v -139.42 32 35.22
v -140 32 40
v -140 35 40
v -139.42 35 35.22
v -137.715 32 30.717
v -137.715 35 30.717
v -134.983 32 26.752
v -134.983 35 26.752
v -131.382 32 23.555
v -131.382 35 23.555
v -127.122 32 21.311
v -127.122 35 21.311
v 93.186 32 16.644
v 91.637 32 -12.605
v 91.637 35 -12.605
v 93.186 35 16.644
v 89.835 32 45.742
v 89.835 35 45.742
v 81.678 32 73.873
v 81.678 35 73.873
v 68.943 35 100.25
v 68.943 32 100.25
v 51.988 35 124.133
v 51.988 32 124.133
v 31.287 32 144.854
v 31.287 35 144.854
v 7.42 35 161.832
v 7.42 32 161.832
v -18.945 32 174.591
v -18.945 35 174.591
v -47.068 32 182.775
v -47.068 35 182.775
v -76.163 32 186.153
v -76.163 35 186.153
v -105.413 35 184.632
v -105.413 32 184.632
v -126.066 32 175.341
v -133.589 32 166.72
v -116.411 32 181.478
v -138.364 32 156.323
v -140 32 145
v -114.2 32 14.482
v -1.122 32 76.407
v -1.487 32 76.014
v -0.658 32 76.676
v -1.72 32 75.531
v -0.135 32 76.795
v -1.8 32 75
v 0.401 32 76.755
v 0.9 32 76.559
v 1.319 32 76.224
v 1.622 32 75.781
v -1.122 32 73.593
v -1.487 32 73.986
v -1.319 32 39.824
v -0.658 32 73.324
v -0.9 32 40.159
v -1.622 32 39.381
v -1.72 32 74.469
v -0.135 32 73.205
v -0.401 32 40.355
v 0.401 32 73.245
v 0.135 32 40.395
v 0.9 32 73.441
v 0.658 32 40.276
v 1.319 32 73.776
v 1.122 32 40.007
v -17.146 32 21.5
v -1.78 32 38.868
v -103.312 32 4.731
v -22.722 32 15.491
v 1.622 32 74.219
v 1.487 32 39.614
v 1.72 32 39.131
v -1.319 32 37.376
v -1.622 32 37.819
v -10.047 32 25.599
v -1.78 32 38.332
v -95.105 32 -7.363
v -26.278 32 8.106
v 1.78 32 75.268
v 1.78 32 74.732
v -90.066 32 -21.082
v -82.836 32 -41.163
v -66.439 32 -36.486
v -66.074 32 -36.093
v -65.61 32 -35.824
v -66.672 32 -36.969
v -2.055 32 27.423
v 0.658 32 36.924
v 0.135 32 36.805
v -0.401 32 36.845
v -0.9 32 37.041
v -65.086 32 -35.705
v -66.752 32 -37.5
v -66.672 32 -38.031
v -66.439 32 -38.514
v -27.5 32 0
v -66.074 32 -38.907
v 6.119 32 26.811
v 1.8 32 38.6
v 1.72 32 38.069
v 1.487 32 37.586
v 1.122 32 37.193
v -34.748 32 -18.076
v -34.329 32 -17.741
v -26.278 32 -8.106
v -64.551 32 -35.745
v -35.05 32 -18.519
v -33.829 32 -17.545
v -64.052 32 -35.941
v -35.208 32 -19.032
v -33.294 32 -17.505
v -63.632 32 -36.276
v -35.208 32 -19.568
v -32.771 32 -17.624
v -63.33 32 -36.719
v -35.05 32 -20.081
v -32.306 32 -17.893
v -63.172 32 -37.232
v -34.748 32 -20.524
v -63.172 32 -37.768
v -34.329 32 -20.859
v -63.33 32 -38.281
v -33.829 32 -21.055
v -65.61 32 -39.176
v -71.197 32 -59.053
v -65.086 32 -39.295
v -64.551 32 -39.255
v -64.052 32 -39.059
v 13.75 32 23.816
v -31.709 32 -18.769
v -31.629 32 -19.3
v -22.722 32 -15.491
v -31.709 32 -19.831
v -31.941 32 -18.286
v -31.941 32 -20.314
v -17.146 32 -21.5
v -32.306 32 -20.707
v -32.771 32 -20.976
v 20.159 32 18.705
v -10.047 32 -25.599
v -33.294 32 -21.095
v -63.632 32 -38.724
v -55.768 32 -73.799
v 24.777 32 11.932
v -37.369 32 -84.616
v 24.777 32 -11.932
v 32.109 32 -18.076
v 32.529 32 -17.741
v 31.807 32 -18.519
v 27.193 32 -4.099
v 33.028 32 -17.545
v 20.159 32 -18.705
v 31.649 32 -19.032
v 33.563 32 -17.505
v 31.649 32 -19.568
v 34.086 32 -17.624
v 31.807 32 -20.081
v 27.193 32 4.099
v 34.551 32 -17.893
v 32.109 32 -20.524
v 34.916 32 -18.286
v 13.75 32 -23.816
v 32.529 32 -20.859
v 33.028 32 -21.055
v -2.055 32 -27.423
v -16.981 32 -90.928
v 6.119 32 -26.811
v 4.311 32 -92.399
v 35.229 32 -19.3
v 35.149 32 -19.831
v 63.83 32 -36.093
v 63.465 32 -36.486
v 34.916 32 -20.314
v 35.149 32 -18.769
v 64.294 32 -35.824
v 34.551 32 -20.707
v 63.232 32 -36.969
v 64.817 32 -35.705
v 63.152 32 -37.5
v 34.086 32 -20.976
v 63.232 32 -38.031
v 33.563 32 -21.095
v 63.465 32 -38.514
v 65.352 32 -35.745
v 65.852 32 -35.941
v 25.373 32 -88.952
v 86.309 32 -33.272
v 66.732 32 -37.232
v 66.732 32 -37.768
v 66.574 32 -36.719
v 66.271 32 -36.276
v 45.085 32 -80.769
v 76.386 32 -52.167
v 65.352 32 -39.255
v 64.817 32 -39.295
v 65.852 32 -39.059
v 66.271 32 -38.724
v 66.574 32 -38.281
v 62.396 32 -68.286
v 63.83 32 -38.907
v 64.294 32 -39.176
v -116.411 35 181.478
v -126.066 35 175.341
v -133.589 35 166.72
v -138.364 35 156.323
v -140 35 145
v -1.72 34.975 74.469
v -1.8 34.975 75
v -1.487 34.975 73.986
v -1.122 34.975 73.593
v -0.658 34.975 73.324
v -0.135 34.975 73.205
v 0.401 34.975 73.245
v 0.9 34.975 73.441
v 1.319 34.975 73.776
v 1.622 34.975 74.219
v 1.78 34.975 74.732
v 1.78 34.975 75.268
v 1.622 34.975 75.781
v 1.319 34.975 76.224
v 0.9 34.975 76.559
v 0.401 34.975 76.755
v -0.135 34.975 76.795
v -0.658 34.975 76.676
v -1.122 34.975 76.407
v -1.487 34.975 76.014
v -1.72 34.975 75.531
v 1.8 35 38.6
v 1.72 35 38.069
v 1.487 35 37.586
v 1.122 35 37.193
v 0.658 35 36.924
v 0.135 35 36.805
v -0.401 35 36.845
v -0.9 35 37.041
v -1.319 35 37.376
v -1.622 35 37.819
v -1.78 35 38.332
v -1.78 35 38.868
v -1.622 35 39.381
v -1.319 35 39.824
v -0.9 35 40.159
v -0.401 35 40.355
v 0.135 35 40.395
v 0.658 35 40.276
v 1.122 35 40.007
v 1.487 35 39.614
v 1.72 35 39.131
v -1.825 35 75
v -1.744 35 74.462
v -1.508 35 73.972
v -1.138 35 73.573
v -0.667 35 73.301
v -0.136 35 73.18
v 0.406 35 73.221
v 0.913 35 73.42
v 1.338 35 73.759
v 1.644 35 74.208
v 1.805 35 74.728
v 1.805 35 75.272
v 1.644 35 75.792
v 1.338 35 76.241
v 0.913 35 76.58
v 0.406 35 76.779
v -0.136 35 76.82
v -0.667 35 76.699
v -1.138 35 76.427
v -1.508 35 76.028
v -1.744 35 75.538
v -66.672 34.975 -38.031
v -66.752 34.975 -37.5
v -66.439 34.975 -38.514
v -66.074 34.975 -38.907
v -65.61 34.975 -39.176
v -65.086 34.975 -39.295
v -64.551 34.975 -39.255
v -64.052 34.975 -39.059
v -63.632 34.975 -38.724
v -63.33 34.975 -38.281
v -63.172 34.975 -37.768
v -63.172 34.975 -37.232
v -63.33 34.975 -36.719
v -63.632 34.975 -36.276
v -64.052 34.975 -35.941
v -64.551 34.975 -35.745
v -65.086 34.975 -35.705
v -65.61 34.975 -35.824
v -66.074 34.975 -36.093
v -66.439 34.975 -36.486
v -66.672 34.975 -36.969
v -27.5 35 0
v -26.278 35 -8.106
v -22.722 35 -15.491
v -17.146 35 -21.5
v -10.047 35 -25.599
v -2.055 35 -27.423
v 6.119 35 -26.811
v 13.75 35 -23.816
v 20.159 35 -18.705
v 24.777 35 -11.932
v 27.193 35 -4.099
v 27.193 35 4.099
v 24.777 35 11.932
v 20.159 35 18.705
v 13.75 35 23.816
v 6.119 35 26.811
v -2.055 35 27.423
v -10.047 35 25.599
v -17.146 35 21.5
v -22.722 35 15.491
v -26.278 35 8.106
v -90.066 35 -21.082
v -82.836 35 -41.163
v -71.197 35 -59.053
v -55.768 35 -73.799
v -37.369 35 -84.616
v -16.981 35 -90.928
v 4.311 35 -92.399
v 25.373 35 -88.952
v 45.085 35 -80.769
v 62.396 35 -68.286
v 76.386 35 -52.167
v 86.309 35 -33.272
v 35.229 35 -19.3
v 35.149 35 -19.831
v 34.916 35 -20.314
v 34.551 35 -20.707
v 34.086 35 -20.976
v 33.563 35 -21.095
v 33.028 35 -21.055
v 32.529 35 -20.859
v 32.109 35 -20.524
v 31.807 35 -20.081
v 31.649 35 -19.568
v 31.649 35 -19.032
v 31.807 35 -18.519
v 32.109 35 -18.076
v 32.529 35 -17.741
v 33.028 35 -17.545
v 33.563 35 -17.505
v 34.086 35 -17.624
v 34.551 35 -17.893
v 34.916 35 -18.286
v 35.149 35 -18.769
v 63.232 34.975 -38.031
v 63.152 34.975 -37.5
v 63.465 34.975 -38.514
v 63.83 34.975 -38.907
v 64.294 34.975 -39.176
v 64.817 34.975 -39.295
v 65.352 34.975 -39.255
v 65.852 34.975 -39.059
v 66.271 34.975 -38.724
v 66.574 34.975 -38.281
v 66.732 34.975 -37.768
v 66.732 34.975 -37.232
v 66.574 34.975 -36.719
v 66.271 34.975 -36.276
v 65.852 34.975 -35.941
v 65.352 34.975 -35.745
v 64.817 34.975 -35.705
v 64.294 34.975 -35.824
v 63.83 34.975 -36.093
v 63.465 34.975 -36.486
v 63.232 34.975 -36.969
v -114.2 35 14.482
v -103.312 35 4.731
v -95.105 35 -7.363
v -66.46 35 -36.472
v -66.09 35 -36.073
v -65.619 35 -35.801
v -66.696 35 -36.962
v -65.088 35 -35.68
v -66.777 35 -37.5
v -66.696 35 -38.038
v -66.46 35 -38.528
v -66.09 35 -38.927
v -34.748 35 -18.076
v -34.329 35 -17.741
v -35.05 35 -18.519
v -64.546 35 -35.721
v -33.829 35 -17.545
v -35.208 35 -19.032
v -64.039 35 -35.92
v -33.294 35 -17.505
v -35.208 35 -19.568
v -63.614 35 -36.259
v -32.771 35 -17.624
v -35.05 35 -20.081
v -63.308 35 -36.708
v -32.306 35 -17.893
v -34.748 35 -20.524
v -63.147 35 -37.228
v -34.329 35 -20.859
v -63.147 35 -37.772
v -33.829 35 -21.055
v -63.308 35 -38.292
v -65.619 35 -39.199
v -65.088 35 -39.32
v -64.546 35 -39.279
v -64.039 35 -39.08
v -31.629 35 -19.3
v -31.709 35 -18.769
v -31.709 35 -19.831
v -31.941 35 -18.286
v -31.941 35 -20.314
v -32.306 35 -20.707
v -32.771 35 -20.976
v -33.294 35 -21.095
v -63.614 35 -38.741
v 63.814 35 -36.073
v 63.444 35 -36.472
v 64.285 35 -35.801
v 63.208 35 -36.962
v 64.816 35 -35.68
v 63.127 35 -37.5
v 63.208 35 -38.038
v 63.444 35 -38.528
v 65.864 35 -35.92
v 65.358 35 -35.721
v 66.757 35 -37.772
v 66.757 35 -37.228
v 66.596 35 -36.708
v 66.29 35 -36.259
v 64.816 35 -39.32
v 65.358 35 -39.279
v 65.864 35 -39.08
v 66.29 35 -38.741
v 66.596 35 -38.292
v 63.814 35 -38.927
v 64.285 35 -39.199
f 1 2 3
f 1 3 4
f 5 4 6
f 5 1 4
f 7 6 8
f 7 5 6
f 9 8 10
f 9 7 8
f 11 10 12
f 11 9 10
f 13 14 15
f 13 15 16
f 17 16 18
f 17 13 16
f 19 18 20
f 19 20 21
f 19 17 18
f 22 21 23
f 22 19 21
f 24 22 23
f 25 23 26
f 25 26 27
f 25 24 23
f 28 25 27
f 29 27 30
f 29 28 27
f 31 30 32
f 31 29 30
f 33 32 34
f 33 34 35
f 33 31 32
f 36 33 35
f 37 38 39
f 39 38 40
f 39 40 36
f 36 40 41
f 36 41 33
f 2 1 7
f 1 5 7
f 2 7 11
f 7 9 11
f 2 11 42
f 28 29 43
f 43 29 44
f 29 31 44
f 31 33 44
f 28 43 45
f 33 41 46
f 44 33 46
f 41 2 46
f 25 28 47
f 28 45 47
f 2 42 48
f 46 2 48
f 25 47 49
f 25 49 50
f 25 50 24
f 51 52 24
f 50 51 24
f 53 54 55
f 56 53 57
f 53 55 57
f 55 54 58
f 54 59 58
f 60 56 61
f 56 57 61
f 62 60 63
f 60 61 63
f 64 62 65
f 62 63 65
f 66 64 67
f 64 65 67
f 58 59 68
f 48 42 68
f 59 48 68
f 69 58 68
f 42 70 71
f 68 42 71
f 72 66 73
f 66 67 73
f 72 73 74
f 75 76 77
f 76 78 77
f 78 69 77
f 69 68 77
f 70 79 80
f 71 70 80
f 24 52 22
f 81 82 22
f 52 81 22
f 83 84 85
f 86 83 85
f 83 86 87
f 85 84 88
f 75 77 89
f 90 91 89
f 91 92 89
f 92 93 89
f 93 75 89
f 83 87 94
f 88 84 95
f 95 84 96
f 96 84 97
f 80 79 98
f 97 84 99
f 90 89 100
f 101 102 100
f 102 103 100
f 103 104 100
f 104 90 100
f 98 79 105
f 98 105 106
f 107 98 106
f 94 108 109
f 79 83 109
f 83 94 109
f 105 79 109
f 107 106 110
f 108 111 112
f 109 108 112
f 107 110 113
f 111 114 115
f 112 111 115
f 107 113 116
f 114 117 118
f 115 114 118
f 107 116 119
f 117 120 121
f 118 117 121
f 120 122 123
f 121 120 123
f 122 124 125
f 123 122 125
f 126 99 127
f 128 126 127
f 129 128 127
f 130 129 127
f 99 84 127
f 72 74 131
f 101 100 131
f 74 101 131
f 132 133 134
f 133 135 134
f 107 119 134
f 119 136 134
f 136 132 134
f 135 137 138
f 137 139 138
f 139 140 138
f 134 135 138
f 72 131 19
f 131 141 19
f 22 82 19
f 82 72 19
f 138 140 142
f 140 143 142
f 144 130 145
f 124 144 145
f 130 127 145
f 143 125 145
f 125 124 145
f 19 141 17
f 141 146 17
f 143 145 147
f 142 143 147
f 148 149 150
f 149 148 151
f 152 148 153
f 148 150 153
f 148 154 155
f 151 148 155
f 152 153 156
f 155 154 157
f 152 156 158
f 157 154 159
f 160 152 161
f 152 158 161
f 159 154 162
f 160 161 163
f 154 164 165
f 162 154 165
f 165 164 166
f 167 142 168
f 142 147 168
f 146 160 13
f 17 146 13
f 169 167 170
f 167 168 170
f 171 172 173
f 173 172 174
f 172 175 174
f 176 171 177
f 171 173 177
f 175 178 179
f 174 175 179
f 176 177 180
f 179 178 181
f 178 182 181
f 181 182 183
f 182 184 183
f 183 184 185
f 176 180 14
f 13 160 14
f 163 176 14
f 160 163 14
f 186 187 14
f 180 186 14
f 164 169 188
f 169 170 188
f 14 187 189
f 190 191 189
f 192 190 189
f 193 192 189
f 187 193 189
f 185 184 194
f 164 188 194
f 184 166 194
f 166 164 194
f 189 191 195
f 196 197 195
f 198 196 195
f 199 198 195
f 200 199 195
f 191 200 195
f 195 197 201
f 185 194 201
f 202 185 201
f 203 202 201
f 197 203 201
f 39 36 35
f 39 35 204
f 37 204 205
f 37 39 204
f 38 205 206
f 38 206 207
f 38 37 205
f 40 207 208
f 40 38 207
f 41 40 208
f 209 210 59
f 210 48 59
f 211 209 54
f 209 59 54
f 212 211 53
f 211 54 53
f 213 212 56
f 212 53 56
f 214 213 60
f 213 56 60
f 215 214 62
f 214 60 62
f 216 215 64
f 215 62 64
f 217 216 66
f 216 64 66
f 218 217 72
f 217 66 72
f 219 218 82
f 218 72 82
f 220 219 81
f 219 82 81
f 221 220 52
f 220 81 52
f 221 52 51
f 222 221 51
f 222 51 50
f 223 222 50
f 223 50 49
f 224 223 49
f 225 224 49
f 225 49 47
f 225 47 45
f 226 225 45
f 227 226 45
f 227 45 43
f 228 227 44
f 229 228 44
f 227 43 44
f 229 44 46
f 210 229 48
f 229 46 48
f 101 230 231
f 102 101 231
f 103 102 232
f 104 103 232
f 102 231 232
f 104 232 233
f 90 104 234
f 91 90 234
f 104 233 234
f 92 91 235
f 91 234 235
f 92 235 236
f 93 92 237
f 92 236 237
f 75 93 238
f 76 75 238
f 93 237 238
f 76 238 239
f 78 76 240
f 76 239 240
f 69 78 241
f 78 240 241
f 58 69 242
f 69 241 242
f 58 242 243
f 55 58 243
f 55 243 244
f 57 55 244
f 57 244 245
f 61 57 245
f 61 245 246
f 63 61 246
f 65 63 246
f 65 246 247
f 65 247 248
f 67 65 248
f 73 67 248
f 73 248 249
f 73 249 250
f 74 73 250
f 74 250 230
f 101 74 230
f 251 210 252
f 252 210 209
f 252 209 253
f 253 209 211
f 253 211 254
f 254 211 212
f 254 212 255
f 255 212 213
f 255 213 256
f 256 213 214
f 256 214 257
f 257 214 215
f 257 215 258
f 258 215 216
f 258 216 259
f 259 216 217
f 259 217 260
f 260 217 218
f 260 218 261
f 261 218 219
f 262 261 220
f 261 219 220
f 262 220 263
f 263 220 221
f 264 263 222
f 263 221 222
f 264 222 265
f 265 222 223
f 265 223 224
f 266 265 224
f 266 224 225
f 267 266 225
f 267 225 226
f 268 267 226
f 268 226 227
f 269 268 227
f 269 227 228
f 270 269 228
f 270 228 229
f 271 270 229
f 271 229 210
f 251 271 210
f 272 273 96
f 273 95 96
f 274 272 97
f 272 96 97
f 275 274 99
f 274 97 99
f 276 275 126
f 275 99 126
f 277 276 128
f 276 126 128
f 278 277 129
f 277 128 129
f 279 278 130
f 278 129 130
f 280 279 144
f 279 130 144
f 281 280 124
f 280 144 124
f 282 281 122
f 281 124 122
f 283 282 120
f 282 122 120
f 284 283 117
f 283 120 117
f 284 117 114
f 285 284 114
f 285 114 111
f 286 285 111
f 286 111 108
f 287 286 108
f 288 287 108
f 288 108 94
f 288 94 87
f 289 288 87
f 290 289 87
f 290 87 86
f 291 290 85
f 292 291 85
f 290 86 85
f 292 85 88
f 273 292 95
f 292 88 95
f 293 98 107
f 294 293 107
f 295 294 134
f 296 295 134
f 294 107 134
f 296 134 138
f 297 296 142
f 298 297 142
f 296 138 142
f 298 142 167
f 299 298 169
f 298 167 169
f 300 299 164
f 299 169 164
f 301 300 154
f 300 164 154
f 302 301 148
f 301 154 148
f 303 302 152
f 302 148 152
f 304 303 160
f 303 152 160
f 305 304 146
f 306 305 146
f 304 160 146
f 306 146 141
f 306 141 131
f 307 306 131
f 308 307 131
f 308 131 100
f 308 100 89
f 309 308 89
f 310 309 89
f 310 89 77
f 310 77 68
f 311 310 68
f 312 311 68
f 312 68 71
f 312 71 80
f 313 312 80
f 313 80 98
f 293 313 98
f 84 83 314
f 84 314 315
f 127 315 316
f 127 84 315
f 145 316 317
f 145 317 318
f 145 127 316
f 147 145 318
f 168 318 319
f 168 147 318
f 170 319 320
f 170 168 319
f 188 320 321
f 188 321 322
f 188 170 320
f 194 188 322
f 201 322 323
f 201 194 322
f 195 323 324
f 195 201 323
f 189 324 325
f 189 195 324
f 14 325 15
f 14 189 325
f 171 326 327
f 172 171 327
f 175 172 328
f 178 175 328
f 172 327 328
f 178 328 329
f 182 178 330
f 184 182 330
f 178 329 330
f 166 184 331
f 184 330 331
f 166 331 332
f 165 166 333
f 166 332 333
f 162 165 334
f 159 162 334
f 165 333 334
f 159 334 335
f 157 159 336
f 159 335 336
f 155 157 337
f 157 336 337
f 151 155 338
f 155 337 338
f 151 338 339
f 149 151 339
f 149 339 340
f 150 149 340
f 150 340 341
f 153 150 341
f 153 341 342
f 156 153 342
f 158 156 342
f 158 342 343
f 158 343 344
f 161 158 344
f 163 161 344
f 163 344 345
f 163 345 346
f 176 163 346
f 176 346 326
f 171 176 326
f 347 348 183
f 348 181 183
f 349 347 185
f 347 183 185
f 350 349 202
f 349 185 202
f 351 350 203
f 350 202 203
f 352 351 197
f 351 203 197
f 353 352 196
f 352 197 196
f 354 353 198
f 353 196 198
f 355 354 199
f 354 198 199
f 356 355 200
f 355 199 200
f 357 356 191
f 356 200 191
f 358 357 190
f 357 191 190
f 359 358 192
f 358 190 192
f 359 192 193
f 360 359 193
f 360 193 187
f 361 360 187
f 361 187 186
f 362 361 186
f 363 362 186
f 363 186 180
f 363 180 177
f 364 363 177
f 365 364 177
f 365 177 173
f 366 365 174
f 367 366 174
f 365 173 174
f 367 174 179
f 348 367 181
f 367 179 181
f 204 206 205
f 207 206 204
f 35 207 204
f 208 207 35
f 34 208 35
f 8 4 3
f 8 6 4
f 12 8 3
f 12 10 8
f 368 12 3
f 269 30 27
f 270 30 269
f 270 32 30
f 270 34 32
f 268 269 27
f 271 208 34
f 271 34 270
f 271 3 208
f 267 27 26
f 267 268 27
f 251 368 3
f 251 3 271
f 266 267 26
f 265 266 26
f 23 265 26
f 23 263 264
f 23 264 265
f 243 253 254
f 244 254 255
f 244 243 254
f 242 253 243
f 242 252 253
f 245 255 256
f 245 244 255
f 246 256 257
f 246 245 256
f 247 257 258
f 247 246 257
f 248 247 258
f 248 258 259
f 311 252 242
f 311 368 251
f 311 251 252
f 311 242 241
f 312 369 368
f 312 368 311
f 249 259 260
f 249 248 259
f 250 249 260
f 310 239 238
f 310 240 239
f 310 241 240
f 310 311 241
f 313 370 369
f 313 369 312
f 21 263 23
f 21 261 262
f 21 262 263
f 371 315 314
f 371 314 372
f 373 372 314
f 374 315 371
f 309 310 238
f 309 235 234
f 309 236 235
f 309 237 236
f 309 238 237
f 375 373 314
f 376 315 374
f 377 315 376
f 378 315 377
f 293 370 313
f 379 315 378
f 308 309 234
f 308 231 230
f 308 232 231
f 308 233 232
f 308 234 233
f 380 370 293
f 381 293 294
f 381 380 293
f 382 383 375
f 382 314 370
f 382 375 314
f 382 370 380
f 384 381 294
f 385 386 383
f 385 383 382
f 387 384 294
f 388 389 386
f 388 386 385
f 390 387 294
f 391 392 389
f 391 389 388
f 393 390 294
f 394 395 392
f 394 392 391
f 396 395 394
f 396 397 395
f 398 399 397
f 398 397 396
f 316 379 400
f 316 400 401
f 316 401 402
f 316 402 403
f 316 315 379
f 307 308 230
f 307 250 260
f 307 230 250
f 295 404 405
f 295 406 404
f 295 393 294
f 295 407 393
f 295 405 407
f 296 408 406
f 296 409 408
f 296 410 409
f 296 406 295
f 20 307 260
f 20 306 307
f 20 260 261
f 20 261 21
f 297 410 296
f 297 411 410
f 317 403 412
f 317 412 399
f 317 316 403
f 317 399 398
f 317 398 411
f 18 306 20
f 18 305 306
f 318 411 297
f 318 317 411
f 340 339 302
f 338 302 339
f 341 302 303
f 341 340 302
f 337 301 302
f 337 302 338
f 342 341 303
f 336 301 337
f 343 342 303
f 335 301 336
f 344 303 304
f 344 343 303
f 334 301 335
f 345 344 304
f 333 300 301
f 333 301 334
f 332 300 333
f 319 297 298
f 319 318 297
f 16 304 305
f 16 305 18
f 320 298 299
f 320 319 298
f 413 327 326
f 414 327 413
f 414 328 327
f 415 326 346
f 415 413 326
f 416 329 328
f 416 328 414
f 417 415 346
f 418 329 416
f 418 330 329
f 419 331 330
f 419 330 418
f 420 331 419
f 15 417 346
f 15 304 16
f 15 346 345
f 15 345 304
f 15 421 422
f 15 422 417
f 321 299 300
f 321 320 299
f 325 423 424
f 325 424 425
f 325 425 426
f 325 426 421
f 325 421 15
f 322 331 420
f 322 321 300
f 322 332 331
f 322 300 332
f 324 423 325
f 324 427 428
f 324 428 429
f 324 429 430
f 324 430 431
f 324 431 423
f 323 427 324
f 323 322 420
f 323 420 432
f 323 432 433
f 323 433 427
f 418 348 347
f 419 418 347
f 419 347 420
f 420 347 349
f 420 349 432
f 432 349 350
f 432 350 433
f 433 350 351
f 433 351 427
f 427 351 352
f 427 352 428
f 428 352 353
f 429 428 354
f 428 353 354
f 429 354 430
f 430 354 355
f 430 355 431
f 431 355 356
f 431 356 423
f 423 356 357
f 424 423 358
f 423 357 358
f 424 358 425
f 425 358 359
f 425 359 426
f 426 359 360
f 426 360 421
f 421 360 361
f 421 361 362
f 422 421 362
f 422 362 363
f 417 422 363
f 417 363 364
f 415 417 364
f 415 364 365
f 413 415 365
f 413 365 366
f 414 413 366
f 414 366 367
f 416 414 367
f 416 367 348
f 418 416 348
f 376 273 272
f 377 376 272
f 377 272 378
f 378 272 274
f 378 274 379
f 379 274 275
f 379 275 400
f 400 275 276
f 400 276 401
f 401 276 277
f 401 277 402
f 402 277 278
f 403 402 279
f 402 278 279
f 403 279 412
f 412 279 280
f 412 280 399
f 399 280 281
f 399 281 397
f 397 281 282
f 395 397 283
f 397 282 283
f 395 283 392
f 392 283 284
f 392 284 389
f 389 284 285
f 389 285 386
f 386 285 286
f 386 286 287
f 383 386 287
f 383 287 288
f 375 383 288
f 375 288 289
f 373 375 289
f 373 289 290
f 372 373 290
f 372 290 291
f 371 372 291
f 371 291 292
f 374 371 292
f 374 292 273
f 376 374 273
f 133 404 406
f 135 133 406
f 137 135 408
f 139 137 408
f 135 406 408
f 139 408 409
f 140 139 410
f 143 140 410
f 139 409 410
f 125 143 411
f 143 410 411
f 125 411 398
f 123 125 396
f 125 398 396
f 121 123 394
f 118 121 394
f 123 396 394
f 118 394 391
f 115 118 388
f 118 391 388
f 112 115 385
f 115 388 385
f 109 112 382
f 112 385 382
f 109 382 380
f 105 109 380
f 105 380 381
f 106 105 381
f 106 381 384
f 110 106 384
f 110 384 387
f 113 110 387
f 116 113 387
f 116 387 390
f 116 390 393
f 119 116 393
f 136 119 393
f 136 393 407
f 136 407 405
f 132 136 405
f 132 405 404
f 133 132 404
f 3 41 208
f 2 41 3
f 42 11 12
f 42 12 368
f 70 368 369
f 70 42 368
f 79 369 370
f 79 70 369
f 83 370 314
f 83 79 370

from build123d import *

# Parameters (mm, degrees)
SKETCH1_W                      = 400
SKETCH1_H                      = 400
BOSS_EXTRUDE1_DEPTH            = 3
HOLE1_D                        = 55
HOLE1_DEPTH                    = 100
M3_CLEARANCE_HOLE2_D           = 3.6
SKETCH14_W                     = 654.860874268
SKETCH14_H                     = 577.568605061
CUT_EXTRUDE2_DEPTH             = 324.704448038
M3_CLEARANCE_HOLE3_D           = 3.6
M3_CLEARANCE_HOLE3_CSINK_D     = 3.65
M3_CLEARANCE_HOLE3_CSINK_ANGLE = 90


with BuildPart() as part:
    # Sketch1 → Boss-Extrude1 (new body)
    with BuildSketch(Plane(origin=(0, 32, 0), x_dir=(1, 0, 0), z_dir=(0, 1, 0))):
        with Locations((0, -52.110233191)):
            Rectangle(SKETCH1_W, SKETCH1_H)
    extrude(amount=BOSS_EXTRUDE1_DEPTH)

    # Hole1
    with Locations(Plane(origin=(0, 35, 0), x_dir=(1, 0, 0), z_dir=(0, 1, 0))):
        with Locations((0, 0)):
            Hole(HOLE1_D / 2, depth=HOLE1_DEPTH)

    # M3 Clearance Hole2 (through all)
    with Locations(Plane(origin=(0, 32, 0), x_dir=(-1, 0, 0), z_dir=(0, -1, 0))):
        with Locations((-33.428580586, 19.3), (33.428580586, 19.3), (0, -38.6)):
            Hole(M3_CLEARANCE_HOLE2_D / 2)

    # Sketch14 → Cut-Extrude2 (cut, through all)
    with BuildSketch(Plane(origin=(0, 0, 0), x_dir=(1, 0, 0), z_dir=(0, 1, 0))):
        with Locations((9.012512487, -38.692079752)):
            Rectangle(SKETCH14_W, SKETCH14_H)
        with BuildLine():
            Line((-140, -145), (-140, -70))
            Line((-140, -70), (-140, -40))
            ThreePointArc((-140, -40), (-136.468645007, -28.651707986), (-127.121626837, -21.310900739))
            ThreePointArc((-127.121626837, -21.310900739), (-103.31209295, -4.731224861), (-90.065586424, 21.081749027))
            ThreePointArc((-90.065586424, 21.081749027), (4.310811973, 92.399496211), (91.63719038, 12.604576122))
            ThreePointArc((91.63719038, 12.604576122), (42.071647749, -134.927150214), (-105.413194935, -184.632023928))
            ThreePointArc((-105.413194935, -184.632023928), (-130.137416921, -171.300876436), (-140, -145))
        make_face(mode=Mode.SUBTRACT)
    extrude(amount=CUT_EXTRUDE2_DEPTH, mode=Mode.SUBTRACT)

    # M3 Clearance Hole3 (through all)
    with Locations(Plane(origin=(0, 35, 0), x_dir=(1, 0, 0), z_dir=(0, 1, 0))):
        with Locations((-64.951905284, 37.5), (0, -75), (64.951905284, 37.5)):
            CounterSinkHole(M3_CLEARANCE_HOLE3_D / 2, M3_CLEARANCE_HOLE3_CSINK_D / 2, counter_sink_angle=M3_CLEARANCE_HOLE3_CSINK_ANGLE)


solid = part.part
